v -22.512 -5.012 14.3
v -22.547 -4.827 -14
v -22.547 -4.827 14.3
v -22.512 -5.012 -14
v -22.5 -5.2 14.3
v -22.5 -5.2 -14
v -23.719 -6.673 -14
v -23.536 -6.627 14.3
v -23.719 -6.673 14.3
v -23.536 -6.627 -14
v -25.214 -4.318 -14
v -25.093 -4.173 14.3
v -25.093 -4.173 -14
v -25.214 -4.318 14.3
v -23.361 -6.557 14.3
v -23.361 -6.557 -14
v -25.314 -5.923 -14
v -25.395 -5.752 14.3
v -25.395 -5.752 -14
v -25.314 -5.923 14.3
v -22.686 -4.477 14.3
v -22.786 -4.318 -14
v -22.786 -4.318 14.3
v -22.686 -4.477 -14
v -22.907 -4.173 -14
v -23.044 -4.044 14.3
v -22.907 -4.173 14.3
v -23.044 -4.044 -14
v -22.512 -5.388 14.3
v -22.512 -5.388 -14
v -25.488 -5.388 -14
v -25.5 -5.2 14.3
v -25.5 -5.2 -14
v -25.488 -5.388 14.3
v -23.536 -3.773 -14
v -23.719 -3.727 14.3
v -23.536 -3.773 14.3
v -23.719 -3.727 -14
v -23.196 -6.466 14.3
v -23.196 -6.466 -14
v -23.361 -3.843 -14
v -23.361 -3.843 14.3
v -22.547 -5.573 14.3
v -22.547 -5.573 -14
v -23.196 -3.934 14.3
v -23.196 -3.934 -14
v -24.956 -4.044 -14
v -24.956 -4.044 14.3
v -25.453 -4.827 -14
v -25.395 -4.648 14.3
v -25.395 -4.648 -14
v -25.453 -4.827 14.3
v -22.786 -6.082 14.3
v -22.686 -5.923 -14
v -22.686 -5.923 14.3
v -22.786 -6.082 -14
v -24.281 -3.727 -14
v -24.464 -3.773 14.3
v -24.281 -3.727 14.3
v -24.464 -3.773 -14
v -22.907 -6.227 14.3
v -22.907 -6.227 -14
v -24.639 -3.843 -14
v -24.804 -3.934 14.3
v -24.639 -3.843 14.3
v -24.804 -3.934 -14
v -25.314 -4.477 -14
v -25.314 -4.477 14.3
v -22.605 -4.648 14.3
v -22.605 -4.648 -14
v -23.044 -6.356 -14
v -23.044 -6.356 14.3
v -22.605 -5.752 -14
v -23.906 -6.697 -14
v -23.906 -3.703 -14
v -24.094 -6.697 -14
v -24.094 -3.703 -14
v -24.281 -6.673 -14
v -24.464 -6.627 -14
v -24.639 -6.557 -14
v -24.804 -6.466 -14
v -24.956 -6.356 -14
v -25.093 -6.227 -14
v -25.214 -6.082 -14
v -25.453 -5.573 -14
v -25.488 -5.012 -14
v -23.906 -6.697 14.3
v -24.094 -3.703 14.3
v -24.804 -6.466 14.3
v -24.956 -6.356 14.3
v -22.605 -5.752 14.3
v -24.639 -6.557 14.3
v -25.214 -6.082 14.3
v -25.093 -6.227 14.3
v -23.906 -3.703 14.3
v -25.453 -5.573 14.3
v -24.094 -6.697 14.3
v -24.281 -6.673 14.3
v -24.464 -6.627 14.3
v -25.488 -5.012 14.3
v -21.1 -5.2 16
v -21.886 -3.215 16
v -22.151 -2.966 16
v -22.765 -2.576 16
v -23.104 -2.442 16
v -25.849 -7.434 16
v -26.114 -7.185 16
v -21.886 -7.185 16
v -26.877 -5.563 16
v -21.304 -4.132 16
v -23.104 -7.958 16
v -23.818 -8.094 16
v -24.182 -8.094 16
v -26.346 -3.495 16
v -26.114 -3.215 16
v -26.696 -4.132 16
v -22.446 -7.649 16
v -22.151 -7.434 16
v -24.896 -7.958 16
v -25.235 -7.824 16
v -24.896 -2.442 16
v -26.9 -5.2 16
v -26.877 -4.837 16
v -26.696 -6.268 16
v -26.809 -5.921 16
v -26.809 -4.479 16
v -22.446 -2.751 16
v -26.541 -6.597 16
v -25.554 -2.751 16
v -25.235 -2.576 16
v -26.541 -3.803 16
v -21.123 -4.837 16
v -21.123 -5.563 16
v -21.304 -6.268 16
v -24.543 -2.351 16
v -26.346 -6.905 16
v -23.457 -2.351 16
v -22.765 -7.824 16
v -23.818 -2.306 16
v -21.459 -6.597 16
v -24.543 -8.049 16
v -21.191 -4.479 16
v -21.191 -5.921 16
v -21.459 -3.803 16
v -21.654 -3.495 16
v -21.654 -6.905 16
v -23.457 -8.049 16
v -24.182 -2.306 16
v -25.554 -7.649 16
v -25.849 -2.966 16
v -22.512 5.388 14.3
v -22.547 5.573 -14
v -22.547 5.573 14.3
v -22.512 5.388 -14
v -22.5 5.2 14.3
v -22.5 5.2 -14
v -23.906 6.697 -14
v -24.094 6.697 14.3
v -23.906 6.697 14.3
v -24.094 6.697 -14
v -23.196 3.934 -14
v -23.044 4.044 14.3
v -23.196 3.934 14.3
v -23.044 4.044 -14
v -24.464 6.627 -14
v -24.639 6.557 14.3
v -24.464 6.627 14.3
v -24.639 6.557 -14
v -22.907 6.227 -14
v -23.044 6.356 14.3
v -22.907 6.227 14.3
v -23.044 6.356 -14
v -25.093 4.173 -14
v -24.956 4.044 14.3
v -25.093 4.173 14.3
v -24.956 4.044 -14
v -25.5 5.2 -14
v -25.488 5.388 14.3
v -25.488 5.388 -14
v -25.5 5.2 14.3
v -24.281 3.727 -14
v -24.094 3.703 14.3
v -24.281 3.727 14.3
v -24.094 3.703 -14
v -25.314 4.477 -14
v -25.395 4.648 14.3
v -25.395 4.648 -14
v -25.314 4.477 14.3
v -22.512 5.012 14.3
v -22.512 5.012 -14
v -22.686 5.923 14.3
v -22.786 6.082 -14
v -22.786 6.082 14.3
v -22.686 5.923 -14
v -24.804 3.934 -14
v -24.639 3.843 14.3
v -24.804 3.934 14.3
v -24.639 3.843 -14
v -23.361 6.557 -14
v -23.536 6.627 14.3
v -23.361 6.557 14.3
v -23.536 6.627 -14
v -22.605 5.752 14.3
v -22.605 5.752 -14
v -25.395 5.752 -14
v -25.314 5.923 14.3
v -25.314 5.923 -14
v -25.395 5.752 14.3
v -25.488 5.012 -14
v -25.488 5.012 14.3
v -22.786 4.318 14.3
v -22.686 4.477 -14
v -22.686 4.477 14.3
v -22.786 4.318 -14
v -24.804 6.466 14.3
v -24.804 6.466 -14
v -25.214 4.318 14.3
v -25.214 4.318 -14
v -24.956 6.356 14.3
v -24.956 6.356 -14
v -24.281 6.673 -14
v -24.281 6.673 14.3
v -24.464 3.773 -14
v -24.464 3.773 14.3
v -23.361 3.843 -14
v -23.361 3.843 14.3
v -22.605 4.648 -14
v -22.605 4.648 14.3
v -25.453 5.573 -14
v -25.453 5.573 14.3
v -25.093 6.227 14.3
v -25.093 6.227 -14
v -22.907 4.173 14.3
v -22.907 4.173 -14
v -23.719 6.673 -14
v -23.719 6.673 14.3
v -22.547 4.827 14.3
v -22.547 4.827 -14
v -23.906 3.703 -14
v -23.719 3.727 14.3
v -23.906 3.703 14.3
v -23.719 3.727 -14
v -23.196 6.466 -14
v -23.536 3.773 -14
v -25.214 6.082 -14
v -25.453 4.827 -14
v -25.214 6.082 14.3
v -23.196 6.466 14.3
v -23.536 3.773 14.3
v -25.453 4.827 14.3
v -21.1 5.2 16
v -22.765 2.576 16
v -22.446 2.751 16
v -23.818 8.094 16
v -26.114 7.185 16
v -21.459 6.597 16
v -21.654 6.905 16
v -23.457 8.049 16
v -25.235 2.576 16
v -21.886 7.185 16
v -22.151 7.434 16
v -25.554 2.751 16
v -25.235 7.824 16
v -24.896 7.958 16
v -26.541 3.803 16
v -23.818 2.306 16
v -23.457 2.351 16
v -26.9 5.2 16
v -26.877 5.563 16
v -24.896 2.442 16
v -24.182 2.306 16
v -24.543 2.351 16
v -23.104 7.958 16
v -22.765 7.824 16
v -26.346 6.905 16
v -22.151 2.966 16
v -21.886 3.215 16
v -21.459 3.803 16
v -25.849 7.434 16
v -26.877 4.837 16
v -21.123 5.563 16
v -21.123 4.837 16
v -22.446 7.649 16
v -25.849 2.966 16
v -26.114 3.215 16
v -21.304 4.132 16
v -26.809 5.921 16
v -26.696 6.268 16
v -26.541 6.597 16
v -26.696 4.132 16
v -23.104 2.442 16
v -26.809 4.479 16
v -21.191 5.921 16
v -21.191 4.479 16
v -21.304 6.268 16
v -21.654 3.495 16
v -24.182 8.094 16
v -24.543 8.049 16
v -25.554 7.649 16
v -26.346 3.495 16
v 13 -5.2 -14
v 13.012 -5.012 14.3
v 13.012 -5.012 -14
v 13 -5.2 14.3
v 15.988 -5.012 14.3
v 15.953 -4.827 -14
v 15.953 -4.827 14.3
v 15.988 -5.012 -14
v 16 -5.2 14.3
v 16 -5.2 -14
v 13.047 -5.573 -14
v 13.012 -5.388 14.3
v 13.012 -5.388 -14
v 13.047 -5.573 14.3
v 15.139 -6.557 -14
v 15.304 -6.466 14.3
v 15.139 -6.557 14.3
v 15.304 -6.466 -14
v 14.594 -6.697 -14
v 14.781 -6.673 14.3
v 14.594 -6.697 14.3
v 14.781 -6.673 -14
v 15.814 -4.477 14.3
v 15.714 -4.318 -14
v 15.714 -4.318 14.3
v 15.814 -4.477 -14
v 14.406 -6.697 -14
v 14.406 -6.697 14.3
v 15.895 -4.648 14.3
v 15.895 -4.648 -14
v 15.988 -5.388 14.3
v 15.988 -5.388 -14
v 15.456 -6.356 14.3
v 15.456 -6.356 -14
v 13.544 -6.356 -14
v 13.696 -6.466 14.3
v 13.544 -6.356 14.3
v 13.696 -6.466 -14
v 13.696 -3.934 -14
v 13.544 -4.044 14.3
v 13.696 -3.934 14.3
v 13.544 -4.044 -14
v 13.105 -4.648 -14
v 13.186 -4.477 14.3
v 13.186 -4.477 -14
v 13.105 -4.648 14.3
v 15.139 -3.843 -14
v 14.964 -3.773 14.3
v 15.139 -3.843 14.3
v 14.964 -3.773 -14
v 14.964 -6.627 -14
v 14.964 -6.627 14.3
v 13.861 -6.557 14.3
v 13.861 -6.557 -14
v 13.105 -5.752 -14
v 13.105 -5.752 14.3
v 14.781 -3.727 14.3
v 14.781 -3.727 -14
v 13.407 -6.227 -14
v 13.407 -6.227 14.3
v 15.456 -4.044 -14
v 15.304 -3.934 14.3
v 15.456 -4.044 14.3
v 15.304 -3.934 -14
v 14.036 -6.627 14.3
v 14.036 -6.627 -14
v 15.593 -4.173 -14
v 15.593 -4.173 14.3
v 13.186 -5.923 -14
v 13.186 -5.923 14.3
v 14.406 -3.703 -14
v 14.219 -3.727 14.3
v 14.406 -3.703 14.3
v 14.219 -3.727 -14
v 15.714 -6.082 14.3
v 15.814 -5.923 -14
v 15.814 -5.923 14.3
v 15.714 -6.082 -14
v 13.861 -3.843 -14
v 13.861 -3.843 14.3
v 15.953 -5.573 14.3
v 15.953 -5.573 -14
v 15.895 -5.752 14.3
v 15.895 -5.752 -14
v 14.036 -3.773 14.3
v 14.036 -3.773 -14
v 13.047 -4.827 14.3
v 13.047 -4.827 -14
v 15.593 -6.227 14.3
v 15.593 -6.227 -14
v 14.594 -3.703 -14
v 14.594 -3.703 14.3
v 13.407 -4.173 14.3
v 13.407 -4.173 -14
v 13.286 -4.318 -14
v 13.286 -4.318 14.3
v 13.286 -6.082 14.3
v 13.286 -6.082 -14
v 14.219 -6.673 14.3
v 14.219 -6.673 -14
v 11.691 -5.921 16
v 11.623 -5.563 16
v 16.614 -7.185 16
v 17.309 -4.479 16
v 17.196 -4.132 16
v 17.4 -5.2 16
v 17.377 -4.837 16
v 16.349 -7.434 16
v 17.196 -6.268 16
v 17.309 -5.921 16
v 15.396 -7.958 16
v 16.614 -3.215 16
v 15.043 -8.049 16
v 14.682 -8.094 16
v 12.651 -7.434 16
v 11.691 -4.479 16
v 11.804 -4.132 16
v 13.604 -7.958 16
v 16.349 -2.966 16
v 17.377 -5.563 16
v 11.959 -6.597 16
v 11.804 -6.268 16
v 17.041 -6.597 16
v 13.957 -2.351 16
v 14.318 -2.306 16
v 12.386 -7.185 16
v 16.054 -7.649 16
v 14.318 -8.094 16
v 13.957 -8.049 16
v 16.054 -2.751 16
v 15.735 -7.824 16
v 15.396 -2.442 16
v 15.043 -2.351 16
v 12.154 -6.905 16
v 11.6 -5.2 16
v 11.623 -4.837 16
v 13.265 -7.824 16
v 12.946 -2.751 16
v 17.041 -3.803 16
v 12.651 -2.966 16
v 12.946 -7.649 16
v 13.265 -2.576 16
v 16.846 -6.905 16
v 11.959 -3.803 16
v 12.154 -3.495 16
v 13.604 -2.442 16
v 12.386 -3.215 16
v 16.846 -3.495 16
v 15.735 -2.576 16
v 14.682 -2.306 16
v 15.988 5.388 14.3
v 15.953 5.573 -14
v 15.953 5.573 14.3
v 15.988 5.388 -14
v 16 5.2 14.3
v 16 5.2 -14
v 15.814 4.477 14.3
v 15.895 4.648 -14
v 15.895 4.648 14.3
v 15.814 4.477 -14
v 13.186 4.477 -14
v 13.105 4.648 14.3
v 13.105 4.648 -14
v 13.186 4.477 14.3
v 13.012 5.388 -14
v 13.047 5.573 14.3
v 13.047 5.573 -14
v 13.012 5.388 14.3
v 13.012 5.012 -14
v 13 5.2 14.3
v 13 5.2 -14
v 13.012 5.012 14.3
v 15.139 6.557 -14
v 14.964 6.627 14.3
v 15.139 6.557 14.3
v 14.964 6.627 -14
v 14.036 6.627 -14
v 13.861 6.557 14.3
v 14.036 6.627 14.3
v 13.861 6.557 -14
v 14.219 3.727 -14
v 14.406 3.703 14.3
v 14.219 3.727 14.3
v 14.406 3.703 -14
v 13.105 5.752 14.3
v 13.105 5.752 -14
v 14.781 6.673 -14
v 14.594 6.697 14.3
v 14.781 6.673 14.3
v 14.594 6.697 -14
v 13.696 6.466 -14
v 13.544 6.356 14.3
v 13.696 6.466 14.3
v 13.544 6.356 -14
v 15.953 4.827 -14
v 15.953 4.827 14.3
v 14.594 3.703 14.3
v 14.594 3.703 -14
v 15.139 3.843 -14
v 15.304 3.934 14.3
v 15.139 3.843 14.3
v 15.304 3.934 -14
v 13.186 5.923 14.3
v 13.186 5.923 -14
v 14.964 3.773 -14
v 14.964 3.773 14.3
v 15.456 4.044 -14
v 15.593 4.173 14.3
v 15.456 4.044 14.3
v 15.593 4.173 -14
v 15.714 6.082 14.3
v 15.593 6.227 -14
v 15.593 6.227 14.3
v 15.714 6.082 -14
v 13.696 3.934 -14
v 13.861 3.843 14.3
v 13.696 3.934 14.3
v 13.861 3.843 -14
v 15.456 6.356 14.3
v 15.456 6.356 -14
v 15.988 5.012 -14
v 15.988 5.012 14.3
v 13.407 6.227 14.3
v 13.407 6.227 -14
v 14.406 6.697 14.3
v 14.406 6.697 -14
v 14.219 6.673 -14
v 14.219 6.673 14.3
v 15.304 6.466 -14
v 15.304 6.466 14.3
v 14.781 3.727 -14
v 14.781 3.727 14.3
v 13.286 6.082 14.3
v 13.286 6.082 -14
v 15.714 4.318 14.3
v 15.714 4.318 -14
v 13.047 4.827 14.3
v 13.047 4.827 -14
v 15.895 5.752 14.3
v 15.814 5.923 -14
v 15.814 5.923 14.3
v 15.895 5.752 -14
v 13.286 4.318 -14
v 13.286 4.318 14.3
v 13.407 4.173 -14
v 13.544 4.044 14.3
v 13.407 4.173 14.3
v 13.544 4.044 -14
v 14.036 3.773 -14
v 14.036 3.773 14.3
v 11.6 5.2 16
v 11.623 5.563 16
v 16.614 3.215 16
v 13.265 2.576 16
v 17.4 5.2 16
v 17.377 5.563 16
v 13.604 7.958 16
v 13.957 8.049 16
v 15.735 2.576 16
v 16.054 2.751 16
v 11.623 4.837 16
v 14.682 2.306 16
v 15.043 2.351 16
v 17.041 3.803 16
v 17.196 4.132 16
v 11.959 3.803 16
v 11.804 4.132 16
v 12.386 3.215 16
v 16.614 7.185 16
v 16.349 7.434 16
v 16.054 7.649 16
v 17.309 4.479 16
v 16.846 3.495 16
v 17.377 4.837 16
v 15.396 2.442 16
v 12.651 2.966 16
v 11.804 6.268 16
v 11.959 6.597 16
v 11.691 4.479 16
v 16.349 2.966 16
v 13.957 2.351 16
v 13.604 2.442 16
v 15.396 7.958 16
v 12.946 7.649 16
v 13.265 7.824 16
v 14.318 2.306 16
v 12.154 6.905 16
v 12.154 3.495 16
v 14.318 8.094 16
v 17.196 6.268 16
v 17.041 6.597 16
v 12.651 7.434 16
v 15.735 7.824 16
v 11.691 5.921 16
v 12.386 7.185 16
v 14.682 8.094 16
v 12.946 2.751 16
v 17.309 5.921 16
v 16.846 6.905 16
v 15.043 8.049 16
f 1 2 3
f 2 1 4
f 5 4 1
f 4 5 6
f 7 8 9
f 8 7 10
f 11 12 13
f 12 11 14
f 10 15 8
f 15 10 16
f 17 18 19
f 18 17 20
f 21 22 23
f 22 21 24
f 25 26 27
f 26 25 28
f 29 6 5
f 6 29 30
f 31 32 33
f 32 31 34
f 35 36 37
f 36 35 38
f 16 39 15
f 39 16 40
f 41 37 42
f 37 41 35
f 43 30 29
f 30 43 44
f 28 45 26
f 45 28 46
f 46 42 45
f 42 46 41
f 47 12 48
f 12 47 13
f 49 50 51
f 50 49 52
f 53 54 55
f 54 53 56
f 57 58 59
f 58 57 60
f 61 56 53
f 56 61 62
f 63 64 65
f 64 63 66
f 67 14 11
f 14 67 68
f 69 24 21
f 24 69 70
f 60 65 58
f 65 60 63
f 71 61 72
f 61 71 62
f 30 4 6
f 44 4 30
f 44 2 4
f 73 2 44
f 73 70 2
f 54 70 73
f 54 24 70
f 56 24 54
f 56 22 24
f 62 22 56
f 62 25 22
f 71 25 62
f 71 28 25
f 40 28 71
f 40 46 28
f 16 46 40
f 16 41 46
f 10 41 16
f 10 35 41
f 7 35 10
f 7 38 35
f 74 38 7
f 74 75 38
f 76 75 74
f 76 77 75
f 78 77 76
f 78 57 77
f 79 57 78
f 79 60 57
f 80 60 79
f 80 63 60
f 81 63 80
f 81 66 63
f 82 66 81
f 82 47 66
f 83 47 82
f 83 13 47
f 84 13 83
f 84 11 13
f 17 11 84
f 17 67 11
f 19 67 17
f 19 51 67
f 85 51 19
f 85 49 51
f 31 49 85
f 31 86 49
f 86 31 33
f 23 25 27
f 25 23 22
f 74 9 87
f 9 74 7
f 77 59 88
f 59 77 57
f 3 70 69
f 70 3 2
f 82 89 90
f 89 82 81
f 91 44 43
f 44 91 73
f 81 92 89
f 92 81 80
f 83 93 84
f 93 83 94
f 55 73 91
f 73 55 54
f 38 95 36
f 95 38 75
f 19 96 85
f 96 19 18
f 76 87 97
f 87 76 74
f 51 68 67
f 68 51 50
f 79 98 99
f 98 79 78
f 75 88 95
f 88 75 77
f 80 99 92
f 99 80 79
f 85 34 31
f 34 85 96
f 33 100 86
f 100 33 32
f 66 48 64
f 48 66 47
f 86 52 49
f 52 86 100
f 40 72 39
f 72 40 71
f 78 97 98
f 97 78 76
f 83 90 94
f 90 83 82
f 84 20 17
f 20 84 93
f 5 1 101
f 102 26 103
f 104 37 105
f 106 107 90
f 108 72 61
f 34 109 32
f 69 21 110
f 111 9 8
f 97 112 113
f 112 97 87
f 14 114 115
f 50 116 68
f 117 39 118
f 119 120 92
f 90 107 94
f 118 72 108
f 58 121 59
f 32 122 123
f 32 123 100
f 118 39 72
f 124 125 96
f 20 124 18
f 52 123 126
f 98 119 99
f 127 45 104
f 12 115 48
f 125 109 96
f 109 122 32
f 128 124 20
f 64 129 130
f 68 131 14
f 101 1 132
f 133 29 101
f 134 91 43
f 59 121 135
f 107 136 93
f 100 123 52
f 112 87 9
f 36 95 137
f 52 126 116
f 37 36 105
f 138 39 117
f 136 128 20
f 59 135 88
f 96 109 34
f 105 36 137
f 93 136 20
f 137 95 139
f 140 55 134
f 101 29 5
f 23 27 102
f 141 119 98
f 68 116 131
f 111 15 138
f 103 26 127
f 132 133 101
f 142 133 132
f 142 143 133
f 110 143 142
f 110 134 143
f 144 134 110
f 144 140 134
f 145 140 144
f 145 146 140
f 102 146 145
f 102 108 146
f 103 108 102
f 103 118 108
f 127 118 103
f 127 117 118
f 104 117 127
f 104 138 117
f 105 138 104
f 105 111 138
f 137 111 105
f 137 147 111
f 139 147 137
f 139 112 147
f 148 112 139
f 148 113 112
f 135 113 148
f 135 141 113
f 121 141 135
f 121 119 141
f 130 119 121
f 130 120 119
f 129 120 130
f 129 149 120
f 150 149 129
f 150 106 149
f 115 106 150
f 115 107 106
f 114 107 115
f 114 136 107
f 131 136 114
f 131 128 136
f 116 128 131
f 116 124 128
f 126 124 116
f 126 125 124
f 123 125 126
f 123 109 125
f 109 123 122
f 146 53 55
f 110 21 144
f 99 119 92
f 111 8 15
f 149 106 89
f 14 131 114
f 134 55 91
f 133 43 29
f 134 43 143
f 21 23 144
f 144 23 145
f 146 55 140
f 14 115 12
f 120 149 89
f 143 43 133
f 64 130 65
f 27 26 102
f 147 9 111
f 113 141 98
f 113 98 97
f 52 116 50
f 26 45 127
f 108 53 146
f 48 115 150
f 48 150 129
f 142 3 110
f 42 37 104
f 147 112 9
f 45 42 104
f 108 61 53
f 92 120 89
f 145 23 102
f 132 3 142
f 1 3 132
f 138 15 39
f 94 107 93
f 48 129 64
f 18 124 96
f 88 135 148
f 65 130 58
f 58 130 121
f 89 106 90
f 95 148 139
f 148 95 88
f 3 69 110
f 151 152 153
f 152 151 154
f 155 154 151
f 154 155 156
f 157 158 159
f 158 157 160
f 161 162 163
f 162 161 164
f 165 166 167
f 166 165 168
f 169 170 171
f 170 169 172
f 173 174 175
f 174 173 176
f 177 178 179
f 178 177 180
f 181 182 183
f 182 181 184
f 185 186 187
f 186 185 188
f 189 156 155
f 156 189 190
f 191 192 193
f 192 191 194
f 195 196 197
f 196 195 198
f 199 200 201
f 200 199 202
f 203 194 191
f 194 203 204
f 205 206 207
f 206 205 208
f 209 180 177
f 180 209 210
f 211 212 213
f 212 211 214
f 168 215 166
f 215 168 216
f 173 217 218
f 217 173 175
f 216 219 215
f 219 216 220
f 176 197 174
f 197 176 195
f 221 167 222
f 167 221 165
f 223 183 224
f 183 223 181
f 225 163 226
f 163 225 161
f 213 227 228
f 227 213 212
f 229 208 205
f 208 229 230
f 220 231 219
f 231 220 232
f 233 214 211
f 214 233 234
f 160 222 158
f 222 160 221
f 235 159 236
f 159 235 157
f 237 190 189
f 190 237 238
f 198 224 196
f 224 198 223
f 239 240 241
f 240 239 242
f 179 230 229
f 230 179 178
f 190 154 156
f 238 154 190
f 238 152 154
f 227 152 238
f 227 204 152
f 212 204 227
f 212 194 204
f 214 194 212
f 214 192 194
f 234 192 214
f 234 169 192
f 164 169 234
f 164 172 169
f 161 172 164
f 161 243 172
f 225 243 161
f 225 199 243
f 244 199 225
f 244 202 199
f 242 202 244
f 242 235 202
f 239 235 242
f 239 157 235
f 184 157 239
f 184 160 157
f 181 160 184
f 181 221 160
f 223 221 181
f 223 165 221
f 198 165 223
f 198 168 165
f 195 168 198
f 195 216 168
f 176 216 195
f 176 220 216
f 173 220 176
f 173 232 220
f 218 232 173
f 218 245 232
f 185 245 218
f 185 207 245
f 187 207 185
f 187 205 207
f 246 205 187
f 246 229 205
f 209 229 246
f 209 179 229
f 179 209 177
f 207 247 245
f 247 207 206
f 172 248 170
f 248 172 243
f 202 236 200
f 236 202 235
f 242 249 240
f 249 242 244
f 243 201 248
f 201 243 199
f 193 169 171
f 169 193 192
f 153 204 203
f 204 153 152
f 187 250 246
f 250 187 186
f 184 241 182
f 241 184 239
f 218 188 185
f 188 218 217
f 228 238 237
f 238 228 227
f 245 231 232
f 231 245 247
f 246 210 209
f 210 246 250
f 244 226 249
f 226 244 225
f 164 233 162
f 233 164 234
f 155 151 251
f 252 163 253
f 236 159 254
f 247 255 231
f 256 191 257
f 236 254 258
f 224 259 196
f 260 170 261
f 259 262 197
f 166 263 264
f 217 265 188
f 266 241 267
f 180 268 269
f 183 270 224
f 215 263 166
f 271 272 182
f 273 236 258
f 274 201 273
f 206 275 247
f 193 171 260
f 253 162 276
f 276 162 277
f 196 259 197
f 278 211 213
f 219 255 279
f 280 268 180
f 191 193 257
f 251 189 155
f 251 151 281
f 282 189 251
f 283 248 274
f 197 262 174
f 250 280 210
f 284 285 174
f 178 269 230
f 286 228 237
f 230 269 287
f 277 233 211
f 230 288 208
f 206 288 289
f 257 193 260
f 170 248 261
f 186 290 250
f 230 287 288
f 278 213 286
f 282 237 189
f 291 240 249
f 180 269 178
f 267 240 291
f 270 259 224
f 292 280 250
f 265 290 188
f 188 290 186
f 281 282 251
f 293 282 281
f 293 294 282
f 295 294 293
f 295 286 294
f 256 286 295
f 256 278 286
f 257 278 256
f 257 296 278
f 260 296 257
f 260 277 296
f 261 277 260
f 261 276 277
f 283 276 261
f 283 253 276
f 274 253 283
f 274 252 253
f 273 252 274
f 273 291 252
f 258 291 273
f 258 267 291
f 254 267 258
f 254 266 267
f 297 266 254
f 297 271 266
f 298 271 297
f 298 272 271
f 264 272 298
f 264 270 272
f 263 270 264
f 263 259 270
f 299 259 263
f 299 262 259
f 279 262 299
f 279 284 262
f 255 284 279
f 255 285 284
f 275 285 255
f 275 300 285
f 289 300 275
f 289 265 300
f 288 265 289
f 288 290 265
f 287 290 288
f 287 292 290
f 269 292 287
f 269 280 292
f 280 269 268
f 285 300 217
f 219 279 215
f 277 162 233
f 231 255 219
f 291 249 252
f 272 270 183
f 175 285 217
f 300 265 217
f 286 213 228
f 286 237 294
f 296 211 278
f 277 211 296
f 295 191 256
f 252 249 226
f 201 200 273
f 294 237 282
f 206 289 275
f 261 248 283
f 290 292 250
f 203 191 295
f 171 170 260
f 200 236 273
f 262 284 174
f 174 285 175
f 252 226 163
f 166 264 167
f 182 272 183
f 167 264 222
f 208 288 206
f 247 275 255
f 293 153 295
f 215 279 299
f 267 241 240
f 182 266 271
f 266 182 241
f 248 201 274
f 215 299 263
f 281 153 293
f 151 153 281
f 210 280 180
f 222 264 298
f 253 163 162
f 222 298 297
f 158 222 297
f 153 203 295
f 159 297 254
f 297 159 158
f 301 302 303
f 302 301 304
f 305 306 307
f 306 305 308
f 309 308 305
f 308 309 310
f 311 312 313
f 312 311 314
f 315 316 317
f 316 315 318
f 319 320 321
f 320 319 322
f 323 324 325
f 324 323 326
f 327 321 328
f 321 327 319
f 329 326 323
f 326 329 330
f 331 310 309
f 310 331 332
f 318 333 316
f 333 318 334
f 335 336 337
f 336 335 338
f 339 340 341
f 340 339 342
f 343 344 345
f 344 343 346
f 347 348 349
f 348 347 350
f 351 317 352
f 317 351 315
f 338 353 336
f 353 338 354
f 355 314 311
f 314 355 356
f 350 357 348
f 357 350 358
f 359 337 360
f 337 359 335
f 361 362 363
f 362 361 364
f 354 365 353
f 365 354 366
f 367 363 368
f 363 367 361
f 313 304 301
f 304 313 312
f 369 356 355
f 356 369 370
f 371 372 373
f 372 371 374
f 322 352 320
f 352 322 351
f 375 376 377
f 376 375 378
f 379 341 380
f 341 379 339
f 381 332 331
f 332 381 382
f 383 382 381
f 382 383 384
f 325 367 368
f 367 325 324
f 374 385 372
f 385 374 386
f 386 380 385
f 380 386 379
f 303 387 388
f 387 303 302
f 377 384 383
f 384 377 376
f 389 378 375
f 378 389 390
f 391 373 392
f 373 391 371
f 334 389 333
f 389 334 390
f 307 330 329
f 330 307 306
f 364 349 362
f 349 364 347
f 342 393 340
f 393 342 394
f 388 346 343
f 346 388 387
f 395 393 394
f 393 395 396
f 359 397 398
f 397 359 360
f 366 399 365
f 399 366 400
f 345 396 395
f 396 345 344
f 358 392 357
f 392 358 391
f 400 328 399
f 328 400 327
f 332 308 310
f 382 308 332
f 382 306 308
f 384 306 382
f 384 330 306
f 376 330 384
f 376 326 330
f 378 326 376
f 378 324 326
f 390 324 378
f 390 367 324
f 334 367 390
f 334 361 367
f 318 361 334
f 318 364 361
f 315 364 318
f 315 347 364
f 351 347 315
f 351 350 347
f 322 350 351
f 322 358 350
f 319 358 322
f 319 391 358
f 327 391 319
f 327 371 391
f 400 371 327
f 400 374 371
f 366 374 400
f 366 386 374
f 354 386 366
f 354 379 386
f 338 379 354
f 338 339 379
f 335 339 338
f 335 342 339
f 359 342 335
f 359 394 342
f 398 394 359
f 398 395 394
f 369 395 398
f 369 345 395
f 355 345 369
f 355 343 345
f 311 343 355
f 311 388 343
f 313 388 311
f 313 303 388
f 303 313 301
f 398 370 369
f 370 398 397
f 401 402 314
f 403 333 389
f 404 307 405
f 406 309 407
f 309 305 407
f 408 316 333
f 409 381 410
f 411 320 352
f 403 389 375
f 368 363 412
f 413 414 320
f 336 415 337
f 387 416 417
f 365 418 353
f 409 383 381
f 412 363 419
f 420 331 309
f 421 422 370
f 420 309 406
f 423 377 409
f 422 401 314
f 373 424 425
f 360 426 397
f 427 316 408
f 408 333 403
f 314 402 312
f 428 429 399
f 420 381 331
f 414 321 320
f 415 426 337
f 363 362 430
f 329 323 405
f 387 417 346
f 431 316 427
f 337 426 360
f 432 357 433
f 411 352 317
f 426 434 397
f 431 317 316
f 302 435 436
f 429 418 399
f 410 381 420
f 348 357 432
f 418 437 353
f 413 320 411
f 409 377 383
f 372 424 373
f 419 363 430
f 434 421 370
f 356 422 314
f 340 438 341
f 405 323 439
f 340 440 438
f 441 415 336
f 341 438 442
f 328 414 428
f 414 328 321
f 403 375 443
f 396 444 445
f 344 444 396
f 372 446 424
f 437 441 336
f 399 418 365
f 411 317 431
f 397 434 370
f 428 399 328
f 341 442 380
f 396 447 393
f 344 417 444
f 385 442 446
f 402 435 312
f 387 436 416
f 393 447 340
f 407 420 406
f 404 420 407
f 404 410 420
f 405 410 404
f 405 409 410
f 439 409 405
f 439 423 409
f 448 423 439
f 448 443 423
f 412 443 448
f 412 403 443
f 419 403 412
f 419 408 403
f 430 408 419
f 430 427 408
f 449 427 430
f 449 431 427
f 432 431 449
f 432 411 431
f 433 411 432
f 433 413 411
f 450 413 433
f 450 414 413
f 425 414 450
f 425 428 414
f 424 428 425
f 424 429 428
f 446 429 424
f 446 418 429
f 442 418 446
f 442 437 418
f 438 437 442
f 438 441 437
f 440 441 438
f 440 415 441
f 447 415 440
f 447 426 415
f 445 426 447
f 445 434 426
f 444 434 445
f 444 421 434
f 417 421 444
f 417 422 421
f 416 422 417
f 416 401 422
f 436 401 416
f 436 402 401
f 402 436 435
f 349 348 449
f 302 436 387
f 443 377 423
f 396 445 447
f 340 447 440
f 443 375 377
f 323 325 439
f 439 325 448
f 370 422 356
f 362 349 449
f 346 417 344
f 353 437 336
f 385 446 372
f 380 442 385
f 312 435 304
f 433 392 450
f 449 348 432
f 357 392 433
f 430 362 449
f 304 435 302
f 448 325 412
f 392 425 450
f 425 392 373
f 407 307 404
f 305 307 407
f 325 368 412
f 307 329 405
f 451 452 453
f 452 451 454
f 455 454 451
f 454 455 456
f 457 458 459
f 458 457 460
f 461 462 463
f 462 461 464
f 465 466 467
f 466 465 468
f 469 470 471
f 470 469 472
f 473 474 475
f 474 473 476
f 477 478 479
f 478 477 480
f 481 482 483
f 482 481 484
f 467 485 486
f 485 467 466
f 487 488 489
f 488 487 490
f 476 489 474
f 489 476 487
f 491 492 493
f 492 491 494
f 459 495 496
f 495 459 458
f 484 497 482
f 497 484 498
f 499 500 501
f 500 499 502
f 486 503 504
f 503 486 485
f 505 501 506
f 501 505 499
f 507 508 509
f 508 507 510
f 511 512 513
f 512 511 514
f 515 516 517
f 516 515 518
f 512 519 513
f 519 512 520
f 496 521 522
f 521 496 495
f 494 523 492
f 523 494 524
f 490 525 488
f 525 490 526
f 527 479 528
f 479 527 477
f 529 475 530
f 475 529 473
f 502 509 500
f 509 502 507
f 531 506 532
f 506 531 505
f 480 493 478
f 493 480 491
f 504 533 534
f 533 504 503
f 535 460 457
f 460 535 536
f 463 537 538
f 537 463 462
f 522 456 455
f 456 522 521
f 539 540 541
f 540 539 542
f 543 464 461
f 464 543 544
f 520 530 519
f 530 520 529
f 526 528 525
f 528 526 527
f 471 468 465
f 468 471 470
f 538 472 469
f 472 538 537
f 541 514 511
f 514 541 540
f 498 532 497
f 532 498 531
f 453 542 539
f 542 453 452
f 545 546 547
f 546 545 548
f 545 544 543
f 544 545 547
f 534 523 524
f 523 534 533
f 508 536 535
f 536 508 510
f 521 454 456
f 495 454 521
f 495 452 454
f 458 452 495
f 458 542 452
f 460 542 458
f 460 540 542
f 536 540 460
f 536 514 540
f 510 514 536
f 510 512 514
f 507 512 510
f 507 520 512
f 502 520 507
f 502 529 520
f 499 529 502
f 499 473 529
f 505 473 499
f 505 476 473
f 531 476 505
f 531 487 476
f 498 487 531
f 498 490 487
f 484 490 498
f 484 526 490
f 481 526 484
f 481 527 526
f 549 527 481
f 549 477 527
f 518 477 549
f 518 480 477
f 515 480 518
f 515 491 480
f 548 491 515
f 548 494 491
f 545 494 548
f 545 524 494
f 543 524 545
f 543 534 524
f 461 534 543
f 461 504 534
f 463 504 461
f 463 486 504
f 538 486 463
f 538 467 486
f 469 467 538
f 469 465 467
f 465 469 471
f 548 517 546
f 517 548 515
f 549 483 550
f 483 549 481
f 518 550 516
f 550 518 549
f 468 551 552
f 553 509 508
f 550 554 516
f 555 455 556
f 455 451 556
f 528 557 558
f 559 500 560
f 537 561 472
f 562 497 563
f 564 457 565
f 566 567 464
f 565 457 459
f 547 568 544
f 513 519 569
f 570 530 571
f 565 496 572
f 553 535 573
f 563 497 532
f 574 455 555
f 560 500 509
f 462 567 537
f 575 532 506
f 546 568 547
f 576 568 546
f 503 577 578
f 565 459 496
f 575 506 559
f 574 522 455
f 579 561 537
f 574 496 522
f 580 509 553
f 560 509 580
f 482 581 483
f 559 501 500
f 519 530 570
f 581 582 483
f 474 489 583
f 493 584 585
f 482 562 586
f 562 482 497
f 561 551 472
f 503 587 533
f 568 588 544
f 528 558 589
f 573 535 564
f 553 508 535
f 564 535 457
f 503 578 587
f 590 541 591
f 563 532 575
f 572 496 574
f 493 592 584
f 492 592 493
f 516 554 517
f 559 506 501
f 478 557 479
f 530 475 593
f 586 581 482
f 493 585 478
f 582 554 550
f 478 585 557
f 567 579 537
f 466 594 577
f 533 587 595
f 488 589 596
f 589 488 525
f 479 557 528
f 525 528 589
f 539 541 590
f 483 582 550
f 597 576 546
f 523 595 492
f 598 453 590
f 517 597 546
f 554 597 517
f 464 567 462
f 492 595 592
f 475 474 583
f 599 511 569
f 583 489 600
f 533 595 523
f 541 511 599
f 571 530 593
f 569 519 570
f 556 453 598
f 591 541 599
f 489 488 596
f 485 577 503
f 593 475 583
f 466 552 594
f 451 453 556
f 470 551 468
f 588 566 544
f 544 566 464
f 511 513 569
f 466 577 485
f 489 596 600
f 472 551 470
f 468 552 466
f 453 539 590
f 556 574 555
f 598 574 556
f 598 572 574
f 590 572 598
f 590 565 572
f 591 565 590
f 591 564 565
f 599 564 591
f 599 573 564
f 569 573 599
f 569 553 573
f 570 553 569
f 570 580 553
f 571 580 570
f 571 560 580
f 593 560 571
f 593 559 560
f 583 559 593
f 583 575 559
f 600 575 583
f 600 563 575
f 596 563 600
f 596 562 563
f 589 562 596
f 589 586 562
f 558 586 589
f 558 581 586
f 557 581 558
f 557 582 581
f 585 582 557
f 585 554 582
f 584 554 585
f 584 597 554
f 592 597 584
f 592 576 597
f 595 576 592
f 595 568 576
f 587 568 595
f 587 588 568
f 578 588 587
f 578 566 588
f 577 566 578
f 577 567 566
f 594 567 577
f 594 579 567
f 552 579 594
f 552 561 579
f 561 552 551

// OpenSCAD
$fn = 50;

difference() {
	union() {
		translate(v = [-24, -5.2, -13.999999999999998]) {
			cylinder(h = 28.3, r = 1.5);
		}
		translate(v = [-24, -5.2, 14.3]) {
			cylinder(h = 1.7, r1 = 1.5, r2 = 2.9);
		}
		translate(v = [-24, 5.2, -13.999999999999998]) {
			cylinder(h = 28.3, r = 1.5);
		}
		translate(v = [-24, 5.2, 14.3]) {
			cylinder(h = 1.7, r1 = 1.5, r2 = 2.9);
		}
		translate(v = [14.5, -5.2, -13.999999999999998]) {
			cylinder(h = 28.3, r = 1.5);
		}
		translate(v = [14.5, -5.2, 14.3]) {
			cylinder(h = 1.7, r1 = 1.5, r2 = 2.9);
		}
		translate(v = [14.5, 5.2, -13.999999999999998]) {
			cylinder(h = 28.3, r = 1.5);
		}
		translate(v = [14.5, 5.2, 14.3]) {
			cylinder(h = 1.7, r1 = 1.5, r2 = 2.9);
		}
	}
	union();
}
